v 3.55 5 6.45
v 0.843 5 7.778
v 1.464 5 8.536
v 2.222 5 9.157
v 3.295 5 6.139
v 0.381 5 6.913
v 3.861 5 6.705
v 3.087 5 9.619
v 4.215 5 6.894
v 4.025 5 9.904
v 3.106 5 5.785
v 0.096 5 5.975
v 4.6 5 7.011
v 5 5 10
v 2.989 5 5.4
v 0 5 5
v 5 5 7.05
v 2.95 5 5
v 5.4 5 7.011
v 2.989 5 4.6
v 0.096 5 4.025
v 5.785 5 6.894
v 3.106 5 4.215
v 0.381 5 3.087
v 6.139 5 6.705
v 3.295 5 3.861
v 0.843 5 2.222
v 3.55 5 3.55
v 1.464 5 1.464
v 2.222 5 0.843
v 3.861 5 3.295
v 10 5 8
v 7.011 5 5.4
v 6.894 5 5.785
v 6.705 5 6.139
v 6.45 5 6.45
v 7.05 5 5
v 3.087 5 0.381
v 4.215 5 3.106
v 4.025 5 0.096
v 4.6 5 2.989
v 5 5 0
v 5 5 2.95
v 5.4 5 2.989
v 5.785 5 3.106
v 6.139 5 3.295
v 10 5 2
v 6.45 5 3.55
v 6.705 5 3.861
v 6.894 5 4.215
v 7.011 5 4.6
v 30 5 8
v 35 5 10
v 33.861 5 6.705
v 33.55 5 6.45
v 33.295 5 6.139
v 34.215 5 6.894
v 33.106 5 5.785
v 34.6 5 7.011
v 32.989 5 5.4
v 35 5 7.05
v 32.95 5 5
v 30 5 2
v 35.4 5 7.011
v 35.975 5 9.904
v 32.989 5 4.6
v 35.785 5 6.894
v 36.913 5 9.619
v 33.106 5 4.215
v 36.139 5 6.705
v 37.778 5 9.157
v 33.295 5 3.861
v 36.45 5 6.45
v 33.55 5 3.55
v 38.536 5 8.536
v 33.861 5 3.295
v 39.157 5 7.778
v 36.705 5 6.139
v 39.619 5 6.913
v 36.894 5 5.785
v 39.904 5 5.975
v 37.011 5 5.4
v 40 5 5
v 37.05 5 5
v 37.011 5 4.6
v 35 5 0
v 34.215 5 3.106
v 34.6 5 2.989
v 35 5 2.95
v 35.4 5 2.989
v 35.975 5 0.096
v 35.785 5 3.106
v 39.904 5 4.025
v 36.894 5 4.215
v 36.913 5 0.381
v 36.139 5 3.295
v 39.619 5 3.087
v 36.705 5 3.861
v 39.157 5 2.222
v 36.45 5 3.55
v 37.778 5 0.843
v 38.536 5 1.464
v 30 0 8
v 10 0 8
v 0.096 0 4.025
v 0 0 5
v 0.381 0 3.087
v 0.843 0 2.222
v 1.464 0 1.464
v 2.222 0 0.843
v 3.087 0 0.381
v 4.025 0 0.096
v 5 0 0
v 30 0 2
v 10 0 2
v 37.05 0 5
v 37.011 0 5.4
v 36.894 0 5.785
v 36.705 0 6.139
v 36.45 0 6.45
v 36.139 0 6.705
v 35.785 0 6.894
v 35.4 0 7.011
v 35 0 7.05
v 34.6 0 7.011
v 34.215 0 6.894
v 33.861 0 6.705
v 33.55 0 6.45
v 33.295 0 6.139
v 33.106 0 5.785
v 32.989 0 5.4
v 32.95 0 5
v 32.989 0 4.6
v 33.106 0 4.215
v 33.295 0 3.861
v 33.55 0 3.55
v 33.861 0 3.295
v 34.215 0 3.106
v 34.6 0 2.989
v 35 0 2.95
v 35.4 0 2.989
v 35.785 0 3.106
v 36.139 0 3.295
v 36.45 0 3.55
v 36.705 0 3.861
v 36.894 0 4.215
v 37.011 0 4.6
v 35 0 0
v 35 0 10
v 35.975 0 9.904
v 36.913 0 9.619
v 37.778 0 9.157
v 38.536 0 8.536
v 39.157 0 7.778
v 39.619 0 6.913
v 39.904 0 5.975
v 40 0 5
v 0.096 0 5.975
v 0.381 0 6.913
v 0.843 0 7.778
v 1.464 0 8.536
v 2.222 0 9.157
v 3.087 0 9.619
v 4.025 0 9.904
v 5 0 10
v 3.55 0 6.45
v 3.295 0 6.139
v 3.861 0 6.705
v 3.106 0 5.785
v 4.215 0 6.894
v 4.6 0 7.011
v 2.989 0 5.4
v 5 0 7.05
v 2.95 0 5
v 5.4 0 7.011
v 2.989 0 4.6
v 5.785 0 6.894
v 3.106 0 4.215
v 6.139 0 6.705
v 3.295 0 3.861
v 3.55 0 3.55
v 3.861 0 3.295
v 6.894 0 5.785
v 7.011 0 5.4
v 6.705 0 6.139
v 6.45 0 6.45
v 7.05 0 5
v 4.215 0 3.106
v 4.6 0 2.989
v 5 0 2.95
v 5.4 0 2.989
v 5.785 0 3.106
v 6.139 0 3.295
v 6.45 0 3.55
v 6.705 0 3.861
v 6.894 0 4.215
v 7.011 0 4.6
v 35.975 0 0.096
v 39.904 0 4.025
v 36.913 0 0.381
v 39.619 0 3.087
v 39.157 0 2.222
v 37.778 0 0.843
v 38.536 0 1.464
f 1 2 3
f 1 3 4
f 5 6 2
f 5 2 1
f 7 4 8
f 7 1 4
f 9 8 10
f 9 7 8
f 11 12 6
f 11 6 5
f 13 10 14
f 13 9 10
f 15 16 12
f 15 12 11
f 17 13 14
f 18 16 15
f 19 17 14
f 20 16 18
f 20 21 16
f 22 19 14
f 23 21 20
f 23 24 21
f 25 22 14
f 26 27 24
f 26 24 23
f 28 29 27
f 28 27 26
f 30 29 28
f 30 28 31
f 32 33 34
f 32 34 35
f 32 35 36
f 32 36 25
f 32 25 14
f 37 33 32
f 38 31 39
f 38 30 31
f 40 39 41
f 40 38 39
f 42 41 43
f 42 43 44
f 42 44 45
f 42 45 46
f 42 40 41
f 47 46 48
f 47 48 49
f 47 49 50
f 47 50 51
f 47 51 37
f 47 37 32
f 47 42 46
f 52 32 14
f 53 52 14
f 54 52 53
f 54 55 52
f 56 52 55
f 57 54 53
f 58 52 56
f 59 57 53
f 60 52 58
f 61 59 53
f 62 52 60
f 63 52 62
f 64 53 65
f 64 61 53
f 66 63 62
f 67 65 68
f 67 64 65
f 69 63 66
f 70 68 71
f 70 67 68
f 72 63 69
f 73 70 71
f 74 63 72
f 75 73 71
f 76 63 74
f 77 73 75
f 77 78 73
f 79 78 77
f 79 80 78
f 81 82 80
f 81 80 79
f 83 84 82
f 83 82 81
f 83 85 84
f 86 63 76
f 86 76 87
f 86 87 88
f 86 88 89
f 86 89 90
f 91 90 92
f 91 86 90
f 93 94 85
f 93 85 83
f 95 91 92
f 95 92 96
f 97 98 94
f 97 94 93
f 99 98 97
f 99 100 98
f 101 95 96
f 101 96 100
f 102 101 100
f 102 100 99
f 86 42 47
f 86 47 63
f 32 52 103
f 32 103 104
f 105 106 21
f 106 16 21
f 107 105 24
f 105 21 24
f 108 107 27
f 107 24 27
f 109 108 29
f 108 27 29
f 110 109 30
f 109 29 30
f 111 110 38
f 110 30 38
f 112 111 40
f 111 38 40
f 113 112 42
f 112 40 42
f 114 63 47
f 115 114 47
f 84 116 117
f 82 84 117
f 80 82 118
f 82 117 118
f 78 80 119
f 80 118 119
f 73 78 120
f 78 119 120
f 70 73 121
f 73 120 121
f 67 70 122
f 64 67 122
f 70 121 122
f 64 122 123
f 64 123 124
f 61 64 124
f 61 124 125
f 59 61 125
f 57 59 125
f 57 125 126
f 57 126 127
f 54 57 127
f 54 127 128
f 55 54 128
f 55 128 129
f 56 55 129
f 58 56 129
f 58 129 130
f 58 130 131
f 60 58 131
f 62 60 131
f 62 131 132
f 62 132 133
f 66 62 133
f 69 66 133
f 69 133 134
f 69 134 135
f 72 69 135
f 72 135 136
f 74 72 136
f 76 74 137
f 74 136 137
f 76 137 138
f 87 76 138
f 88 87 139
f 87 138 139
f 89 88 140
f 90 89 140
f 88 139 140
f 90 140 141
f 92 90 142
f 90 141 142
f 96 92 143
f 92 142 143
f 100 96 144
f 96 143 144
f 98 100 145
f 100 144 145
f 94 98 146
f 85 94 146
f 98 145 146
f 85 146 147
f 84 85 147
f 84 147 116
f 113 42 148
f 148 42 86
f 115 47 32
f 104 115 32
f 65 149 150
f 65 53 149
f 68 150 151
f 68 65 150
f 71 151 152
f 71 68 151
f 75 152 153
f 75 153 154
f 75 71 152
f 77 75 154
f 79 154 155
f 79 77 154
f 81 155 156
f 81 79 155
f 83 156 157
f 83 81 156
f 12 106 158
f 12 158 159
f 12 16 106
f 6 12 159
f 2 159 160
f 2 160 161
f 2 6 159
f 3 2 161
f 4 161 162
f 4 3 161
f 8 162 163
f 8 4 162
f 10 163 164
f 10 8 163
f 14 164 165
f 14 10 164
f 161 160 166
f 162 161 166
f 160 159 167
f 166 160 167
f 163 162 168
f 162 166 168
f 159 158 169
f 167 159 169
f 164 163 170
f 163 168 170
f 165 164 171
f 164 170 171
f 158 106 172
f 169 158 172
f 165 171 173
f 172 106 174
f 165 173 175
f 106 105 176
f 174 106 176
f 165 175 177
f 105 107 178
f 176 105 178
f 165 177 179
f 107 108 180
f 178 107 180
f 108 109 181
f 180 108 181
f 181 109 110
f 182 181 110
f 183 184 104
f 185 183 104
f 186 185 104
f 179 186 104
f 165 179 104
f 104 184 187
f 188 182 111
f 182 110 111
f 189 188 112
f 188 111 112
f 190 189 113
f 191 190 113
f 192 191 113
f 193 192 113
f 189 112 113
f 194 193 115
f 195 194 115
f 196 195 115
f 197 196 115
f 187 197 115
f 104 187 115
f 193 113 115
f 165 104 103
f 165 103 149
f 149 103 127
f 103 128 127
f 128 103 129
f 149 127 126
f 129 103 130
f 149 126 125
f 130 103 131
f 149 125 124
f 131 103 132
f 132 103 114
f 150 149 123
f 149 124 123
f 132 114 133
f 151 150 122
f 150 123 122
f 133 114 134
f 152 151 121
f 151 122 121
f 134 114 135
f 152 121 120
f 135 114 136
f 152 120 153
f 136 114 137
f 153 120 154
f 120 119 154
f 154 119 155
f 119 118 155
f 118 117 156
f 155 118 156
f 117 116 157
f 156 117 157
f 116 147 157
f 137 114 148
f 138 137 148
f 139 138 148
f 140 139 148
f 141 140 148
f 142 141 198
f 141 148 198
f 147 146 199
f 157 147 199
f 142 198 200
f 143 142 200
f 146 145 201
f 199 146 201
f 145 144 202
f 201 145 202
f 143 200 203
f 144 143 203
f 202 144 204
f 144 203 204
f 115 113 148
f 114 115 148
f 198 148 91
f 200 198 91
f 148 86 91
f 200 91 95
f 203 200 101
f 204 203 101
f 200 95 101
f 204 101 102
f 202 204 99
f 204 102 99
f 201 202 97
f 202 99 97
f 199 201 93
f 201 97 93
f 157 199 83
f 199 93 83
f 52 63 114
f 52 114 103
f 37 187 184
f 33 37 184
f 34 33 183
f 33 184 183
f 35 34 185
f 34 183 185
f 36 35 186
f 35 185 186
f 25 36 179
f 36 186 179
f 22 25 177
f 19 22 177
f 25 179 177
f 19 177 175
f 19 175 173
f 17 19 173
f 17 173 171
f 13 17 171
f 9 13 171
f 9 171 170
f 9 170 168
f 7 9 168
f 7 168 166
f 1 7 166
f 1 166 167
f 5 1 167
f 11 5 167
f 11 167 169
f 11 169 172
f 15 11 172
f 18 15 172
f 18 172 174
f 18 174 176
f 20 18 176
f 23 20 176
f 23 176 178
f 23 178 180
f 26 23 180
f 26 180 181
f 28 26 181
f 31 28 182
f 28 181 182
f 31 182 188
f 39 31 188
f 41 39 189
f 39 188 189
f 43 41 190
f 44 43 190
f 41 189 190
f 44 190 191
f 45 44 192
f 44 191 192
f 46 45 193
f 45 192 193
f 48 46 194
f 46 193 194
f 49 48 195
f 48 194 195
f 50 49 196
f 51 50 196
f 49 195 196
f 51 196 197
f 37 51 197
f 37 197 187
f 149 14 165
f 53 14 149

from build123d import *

# Parameters (mm, degrees)
F0_W     = 40
F0_H     = 5
F1_DEPTH = 10
F2_R     = 2.05
F3_DEPTH = 25
F4_R     = 2.05
F5_DEPTH = 25
F6_R     = 4.99999
F7_W     = 20
F7_H     = 6
F8_DEPTH = 25


# Not quite as in the source:
# - a fillet or chamfer is up to 0.001 mm smaller than in the source, because OpenCascade refuses the exact size


with BuildPart() as f1:
    # F0 (on Top) → F1 (new body)
    with BuildSketch(Plane.XY):
        with Locations((20, 2.5)):
            Rectangle(F0_W, F0_H)
    extrude(amount=F1_DEPTH)

    # F2 (on face) → F3 (cut)
    with BuildSketch(Plane.XZ):
        with Locations((5, 5)):
            Circle(F2_R)
    extrude(amount=-F3_DEPTH, mode=Mode.SUBTRACT)

    # F4 (on face) → F5 (cut)
    with BuildSketch(Plane.XZ):
        with Locations((35, 5)):
            Circle(F4_R)
    extrude(amount=-F5_DEPTH, mode=Mode.SUBTRACT)

    # F6 (radius 5 in the source; OpenCascade refuses exactly that, so slightly less here)
    f6_edges = [f1.edges().sort_by_distance(p)[0] for p in [
        (0, 2.5, 10),
        (0, 2.5, 0),
        (40, 2.5, 10),
        (40, 2.5, 0),
    ]]
    fillet(f6_edges, radius=F6_R)

    # F7 (on face) → F8 (cut)
    with BuildSketch(Plane(origin=(0, 5, 0), x_dir=(-1, 0, 0), z_dir=(0, 1, 0))):
        with Locations((-20, 5)):
            Rectangle(F7_W, F7_H)
    extrude(amount=-F8_DEPTH, mode=Mode.SUBTRACT)


solid = f1.part
